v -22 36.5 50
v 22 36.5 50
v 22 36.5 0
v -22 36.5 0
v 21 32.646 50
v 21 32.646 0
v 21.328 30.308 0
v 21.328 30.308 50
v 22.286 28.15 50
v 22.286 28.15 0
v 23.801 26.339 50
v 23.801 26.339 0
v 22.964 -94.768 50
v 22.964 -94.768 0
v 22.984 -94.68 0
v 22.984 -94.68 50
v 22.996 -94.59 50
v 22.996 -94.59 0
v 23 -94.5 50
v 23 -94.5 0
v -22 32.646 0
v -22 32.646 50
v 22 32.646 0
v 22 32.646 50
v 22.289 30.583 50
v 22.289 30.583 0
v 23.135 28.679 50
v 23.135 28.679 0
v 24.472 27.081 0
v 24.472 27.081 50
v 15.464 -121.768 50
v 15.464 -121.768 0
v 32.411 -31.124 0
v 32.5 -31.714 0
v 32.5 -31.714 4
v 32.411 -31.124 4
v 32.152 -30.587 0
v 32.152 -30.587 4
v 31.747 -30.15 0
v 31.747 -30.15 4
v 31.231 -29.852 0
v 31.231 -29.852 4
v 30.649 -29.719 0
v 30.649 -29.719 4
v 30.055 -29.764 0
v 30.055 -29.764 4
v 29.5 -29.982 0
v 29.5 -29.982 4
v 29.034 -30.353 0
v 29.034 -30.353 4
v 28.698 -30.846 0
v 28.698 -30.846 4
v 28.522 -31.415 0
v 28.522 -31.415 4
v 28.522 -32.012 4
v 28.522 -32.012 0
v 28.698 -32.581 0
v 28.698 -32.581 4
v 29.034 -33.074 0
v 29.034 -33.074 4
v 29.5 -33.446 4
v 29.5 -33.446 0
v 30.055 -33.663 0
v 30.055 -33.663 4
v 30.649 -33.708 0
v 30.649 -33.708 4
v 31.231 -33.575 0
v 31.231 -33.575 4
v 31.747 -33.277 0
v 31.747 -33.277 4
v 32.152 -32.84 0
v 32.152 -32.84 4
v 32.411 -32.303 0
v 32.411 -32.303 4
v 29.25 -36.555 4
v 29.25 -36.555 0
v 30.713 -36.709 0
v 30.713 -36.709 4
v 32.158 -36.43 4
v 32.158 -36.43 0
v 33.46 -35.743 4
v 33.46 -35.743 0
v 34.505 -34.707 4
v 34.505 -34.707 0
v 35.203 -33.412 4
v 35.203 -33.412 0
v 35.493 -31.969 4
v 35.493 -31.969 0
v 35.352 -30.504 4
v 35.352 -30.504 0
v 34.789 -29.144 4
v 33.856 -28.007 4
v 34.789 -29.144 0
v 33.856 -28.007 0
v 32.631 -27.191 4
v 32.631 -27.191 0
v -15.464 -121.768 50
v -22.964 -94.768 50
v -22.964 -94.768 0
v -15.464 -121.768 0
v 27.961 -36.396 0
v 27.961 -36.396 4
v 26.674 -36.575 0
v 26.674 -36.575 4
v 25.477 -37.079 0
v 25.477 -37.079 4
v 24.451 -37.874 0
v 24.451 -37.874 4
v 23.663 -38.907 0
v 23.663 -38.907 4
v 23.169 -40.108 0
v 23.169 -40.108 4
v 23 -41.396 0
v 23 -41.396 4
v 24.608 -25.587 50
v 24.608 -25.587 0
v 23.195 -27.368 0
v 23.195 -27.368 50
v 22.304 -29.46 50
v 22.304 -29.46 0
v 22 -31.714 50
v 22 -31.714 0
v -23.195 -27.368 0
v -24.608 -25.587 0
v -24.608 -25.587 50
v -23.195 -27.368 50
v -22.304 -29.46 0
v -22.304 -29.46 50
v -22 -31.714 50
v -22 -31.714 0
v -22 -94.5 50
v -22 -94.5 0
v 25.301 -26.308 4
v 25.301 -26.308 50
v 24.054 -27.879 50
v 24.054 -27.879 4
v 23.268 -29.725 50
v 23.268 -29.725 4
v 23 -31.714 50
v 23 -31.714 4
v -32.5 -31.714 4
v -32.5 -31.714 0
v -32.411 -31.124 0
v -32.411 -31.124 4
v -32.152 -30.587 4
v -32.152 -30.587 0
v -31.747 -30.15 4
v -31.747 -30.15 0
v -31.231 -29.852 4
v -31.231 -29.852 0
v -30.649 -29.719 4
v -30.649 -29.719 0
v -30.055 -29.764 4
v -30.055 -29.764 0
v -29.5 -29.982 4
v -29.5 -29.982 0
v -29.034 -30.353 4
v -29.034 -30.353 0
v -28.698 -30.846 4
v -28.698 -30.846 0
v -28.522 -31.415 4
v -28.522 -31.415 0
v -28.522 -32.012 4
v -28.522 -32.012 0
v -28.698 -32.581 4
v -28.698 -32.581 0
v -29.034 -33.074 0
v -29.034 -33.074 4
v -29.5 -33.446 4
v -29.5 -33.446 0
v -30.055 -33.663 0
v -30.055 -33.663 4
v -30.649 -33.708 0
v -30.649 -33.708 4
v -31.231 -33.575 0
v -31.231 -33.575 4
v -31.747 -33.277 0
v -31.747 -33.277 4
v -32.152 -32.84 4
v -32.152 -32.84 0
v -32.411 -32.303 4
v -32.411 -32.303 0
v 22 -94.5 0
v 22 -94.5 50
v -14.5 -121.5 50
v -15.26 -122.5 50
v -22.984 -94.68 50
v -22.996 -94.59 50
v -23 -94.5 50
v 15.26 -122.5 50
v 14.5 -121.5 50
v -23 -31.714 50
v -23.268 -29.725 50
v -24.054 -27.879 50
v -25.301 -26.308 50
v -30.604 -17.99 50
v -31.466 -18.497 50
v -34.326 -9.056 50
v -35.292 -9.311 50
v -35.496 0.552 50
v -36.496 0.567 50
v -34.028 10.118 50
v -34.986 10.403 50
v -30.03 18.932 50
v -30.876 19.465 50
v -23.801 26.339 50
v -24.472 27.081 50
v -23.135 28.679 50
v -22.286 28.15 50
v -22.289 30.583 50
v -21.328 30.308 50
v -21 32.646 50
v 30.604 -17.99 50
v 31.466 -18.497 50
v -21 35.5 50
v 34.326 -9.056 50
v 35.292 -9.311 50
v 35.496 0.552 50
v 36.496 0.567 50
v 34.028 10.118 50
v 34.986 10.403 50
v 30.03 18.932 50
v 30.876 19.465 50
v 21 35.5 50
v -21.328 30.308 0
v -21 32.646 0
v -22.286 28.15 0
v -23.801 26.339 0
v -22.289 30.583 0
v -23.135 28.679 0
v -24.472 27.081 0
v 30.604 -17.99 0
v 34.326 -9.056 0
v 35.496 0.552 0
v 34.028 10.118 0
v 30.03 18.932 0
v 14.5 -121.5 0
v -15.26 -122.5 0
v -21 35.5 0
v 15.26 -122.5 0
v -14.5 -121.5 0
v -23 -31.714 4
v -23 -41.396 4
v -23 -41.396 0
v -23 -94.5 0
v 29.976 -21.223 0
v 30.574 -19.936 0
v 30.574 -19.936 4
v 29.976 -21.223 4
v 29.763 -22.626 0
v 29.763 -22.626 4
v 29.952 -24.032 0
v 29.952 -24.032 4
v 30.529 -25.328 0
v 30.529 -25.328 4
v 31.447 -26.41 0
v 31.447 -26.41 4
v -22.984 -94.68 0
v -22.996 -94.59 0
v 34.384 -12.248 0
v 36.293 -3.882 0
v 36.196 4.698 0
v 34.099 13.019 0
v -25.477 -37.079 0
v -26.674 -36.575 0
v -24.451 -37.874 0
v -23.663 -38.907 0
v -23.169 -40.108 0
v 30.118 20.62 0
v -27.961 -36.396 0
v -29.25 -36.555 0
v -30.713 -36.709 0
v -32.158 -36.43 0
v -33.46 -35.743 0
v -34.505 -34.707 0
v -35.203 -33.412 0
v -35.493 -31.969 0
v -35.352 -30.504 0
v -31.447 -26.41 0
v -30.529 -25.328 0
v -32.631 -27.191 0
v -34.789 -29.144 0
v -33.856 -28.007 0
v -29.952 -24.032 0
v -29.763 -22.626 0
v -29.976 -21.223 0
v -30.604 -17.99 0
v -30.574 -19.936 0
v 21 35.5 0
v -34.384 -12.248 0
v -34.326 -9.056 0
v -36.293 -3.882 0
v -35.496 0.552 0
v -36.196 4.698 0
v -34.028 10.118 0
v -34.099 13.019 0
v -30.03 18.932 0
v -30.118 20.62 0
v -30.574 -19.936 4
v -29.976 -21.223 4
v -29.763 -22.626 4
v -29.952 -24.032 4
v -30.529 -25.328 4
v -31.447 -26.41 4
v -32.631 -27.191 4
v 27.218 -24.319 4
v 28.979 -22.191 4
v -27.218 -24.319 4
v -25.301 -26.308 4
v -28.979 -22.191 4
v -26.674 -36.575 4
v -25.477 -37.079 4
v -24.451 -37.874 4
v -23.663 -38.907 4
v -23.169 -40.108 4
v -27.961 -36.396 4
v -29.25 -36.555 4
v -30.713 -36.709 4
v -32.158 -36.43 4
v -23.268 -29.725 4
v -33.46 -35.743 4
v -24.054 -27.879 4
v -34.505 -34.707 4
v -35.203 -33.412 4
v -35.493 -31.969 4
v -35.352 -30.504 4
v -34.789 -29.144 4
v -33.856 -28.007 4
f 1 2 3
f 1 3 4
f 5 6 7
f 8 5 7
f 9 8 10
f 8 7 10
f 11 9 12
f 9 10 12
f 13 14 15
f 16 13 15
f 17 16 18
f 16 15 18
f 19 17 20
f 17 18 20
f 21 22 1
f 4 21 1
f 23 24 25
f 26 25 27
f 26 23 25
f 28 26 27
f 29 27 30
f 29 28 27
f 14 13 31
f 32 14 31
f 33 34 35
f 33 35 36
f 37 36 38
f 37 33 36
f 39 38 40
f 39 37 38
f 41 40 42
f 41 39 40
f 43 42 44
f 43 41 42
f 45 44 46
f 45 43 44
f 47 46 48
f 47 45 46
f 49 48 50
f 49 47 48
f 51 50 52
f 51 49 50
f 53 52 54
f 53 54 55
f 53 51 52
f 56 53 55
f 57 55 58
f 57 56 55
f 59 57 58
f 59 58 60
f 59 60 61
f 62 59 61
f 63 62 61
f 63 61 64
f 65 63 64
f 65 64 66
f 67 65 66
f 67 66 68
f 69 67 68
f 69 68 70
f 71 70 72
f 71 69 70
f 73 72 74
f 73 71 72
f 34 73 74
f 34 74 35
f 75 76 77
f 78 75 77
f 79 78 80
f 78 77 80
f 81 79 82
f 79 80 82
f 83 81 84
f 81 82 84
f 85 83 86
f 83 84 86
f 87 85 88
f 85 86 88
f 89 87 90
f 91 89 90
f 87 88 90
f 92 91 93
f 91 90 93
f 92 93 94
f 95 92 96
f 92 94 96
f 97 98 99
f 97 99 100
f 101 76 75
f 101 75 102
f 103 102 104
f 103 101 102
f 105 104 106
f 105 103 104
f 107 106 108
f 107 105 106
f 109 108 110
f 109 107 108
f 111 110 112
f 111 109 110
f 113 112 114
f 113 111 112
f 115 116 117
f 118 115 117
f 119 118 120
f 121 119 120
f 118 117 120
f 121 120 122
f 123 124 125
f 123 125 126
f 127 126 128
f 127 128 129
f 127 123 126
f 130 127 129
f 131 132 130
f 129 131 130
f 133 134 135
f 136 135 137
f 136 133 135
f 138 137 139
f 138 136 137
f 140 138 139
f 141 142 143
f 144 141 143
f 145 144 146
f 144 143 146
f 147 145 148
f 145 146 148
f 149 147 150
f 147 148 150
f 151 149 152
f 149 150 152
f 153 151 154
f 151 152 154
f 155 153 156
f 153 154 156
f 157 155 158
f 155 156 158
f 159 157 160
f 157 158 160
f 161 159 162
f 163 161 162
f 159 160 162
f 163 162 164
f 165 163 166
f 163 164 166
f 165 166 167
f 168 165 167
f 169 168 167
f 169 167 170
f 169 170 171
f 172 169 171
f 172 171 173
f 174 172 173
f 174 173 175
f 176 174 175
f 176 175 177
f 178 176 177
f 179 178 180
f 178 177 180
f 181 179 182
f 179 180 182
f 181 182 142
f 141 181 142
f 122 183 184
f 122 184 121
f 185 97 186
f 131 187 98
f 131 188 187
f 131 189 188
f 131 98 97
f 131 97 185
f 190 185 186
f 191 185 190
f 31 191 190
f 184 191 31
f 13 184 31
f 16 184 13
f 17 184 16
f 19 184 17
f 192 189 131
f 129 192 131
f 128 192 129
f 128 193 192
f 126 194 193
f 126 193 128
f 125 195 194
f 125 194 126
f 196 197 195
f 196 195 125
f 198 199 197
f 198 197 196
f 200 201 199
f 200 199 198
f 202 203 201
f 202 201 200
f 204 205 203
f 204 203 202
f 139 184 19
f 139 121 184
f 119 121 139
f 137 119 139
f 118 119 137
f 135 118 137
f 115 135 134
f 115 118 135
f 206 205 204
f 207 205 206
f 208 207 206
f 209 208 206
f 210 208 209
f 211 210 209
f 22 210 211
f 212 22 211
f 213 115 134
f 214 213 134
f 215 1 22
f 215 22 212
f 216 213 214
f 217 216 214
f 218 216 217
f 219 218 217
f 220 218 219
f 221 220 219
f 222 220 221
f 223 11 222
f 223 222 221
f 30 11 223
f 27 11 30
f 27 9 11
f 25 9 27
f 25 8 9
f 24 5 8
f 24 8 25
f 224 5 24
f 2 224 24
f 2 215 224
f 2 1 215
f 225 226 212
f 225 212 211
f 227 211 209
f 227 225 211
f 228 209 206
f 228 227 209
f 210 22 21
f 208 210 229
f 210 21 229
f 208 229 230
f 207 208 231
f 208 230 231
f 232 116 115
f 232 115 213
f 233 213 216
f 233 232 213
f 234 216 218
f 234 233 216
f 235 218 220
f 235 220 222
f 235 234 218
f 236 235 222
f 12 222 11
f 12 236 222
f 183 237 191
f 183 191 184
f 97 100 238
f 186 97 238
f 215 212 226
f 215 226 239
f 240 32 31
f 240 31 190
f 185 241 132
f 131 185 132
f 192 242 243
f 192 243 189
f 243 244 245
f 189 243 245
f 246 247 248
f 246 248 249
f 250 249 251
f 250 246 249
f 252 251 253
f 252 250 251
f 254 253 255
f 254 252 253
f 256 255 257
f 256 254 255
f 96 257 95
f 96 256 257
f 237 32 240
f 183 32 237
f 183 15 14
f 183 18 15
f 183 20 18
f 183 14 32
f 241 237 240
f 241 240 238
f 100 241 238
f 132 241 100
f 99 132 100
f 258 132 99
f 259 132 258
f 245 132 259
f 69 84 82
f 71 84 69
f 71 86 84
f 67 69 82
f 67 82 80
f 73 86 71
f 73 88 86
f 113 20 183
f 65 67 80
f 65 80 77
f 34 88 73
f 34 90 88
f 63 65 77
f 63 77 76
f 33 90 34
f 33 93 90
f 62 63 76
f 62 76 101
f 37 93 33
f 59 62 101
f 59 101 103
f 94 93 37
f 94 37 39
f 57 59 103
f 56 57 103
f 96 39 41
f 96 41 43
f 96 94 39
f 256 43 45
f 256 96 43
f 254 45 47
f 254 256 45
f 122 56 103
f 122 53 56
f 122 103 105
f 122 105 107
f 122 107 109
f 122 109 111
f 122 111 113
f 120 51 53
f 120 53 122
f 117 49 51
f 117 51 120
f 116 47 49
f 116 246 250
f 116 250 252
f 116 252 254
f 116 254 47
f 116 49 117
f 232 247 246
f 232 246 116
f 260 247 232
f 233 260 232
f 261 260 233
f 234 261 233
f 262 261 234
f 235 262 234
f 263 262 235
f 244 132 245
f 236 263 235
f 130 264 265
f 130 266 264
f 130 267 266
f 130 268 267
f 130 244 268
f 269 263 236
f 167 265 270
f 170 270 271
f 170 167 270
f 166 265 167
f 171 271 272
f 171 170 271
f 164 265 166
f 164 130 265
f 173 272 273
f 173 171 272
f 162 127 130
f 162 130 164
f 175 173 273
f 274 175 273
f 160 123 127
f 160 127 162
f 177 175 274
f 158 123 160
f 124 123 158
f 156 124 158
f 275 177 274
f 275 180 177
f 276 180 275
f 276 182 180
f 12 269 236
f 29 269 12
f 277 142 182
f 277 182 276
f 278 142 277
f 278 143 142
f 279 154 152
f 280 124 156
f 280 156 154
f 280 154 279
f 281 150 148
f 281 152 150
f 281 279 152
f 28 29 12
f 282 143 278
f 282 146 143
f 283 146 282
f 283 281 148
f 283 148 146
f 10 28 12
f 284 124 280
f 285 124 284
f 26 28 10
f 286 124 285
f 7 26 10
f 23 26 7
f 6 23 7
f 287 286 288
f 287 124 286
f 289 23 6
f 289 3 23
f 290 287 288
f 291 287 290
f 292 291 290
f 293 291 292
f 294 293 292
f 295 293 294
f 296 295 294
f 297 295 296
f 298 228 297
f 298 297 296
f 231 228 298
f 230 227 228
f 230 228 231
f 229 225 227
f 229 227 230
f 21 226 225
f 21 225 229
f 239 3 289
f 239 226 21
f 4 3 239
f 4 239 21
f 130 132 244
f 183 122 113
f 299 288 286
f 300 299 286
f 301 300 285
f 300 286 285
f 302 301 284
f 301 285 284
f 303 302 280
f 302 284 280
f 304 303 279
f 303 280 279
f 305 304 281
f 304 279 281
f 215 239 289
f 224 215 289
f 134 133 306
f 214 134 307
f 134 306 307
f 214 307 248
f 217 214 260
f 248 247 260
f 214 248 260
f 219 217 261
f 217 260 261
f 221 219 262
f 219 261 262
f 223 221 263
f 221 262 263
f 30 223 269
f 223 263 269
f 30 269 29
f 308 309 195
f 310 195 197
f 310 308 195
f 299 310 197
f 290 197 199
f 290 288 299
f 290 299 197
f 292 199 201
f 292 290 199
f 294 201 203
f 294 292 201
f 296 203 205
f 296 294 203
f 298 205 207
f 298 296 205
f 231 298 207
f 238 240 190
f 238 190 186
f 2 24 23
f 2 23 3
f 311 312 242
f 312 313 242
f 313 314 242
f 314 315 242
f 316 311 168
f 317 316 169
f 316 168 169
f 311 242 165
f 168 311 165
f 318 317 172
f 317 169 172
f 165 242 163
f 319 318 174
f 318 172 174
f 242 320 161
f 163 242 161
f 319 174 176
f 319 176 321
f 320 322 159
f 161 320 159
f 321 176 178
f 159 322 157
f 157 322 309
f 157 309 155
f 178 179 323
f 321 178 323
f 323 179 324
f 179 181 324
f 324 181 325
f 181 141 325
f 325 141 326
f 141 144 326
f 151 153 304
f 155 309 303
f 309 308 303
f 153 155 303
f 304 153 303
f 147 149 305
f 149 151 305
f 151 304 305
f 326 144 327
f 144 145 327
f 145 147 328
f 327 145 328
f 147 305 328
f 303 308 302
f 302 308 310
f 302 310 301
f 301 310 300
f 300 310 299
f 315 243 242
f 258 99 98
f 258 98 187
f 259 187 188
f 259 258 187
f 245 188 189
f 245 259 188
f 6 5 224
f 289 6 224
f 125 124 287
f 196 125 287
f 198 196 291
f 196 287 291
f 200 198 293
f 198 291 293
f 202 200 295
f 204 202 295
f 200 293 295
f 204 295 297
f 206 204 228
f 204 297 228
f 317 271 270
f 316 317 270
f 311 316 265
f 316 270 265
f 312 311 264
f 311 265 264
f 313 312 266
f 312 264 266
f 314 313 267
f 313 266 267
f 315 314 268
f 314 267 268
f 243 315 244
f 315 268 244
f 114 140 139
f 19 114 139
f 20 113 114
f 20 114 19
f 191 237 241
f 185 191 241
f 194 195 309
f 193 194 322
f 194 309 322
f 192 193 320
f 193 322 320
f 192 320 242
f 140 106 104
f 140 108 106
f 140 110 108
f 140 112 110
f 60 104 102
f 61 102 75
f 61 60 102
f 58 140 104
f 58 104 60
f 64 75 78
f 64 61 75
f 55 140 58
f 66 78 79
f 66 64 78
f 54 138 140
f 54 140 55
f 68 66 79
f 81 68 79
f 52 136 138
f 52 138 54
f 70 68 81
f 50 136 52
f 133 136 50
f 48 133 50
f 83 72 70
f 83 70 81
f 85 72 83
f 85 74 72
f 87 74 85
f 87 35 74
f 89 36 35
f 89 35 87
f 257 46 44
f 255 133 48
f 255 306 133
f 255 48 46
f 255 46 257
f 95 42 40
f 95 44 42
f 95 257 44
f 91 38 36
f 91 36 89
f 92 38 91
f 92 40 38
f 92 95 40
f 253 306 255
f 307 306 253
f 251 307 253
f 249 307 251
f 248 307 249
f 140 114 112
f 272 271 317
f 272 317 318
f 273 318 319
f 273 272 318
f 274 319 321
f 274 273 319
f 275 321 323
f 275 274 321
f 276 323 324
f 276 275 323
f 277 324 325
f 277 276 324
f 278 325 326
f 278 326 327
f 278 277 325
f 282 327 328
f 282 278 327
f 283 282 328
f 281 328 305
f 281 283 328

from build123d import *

# Parameters (mm, degrees)
PAD_DEPTH    = 50
SKETCH002_R  = 2
PAD001_DEPTH = 4


with BuildPart() as part:
    # Sketch001 → Pad (new body)
    with BuildSketch(Plane.XY):
        with BuildLine():
            ThreePointArc((24.6079709899, -25.5870624293), (35.4957154017, 0.5515325195), (23.8011399143, 26.3392433221))
            ThreePointArc((21, 32.6458259116), (21.7317857314, 29.1954865465), (23.8011399143, 26.3392433221))
            Line((21, 32.6458259116), (21, 35.5))
            Line((21, 35.5), (0, 35.5))
            Line((0, 35.5), (0, 36.5))
            Line((0, 36.5), (21, 36.5))
            Line((21, 36.5), (22, 36.5))
            Line((22, 35.5), (22, 36.5))
            Line((22, 35.5), (22, 32.6458259714))
            ThreePointArc((22, 32.6458259714), (22.6456934726, 29.60140851), (24.4715946777, 27.0811937316))
            ThreePointArc((25.301164957, -26.3078135127), (36.4955945841, 0.5670766728), (24.4715946777, 27.0811937316))
            ThreePointArc((25.3011649571, -26.3078135128), (23.599229725, -28.7759828987), (23, -31.7135613893))
            Line((23, -31.7135613893), (23, -94.5000000518))
            ThreePointArc((22.9635179252, -94.7676438078), (22.9908375021, -94.6350594104), (23, -94.5000000518))
            Line((22.9635179252, -94.7676438078), (15.4635179477, -121.7676437268))
            Line((15.4635179477, -121.7676437268), (15.2600857185, -122.5))
            Line((14.4999999216, -122.5), (15.2600857185, -122.5))
            Line((14.4999999216, -122.5), (0, -122.5))
            Line((0, -122.5), (0, -121.5))
            Line((0, -121.5), (14.5, -121.5))
            Line((14.5, -121.5), (22, -94.5))
            Line((22, -94.5), (22, -31.7135612569))
            ThreePointArc((24.60797099, -25.5870624293), (22.6791227009, -28.3843158664), (22, -31.7135612569))
        make_face()
    pad = extrude(amount=PAD_DEPTH)

    # Sketch002 → Pad001 (join)
    with BuildSketch(Plane.XY):
        with BuildLine():
            ThreePointArc((29.2499999325, -36.5547909331), (35.2028127321, -33.411664358), (32.6312648681, -27.1905417522))
            ThreePointArc((30.5742701704, -19.9364992801), (29.9521887014, -24.0315673865), (32.6312648681, -27.1905417522))
            Line((30.5742701704, -19.9364992801), (28.638855, -21.477074))
            Line((28.638855, -21.477074), (25.3011353077, -26.3078420275))
            ThreePointArc((25.3011353077, -26.3078420275), (23.5992215491, -28.776002105), (23, -31.7135620015))
            Line((22.267235, -41.500957), (23, -31.7135620015))
            Line((23, -41.3960200869), (22.267235, -41.500957))
            ThreePointArc((29.2499999325, -36.5547909331), (24.9381378123, -37.4431730652), (23, -41.3960200869))
        make_face()
        with Locations((30.5, -31.7135617678)):
            Circle(SKETCH002_R, mode=Mode.SUBTRACT)
    pad001 = extrude(amount=PAD001_DEPTH)

    # Mirrored: Pad, Pad001 across Sketch001 V_Axis
    add(pad.mirror(Plane(origin=(0, 0, 0), x_dir=(0, 0, 1), z_dir=(1, 0, 0))))
    add(pad001.mirror(Plane(origin=(0, 0, 0), x_dir=(0, 0, 1), z_dir=(1, 0, 0))))


solid = part.part
